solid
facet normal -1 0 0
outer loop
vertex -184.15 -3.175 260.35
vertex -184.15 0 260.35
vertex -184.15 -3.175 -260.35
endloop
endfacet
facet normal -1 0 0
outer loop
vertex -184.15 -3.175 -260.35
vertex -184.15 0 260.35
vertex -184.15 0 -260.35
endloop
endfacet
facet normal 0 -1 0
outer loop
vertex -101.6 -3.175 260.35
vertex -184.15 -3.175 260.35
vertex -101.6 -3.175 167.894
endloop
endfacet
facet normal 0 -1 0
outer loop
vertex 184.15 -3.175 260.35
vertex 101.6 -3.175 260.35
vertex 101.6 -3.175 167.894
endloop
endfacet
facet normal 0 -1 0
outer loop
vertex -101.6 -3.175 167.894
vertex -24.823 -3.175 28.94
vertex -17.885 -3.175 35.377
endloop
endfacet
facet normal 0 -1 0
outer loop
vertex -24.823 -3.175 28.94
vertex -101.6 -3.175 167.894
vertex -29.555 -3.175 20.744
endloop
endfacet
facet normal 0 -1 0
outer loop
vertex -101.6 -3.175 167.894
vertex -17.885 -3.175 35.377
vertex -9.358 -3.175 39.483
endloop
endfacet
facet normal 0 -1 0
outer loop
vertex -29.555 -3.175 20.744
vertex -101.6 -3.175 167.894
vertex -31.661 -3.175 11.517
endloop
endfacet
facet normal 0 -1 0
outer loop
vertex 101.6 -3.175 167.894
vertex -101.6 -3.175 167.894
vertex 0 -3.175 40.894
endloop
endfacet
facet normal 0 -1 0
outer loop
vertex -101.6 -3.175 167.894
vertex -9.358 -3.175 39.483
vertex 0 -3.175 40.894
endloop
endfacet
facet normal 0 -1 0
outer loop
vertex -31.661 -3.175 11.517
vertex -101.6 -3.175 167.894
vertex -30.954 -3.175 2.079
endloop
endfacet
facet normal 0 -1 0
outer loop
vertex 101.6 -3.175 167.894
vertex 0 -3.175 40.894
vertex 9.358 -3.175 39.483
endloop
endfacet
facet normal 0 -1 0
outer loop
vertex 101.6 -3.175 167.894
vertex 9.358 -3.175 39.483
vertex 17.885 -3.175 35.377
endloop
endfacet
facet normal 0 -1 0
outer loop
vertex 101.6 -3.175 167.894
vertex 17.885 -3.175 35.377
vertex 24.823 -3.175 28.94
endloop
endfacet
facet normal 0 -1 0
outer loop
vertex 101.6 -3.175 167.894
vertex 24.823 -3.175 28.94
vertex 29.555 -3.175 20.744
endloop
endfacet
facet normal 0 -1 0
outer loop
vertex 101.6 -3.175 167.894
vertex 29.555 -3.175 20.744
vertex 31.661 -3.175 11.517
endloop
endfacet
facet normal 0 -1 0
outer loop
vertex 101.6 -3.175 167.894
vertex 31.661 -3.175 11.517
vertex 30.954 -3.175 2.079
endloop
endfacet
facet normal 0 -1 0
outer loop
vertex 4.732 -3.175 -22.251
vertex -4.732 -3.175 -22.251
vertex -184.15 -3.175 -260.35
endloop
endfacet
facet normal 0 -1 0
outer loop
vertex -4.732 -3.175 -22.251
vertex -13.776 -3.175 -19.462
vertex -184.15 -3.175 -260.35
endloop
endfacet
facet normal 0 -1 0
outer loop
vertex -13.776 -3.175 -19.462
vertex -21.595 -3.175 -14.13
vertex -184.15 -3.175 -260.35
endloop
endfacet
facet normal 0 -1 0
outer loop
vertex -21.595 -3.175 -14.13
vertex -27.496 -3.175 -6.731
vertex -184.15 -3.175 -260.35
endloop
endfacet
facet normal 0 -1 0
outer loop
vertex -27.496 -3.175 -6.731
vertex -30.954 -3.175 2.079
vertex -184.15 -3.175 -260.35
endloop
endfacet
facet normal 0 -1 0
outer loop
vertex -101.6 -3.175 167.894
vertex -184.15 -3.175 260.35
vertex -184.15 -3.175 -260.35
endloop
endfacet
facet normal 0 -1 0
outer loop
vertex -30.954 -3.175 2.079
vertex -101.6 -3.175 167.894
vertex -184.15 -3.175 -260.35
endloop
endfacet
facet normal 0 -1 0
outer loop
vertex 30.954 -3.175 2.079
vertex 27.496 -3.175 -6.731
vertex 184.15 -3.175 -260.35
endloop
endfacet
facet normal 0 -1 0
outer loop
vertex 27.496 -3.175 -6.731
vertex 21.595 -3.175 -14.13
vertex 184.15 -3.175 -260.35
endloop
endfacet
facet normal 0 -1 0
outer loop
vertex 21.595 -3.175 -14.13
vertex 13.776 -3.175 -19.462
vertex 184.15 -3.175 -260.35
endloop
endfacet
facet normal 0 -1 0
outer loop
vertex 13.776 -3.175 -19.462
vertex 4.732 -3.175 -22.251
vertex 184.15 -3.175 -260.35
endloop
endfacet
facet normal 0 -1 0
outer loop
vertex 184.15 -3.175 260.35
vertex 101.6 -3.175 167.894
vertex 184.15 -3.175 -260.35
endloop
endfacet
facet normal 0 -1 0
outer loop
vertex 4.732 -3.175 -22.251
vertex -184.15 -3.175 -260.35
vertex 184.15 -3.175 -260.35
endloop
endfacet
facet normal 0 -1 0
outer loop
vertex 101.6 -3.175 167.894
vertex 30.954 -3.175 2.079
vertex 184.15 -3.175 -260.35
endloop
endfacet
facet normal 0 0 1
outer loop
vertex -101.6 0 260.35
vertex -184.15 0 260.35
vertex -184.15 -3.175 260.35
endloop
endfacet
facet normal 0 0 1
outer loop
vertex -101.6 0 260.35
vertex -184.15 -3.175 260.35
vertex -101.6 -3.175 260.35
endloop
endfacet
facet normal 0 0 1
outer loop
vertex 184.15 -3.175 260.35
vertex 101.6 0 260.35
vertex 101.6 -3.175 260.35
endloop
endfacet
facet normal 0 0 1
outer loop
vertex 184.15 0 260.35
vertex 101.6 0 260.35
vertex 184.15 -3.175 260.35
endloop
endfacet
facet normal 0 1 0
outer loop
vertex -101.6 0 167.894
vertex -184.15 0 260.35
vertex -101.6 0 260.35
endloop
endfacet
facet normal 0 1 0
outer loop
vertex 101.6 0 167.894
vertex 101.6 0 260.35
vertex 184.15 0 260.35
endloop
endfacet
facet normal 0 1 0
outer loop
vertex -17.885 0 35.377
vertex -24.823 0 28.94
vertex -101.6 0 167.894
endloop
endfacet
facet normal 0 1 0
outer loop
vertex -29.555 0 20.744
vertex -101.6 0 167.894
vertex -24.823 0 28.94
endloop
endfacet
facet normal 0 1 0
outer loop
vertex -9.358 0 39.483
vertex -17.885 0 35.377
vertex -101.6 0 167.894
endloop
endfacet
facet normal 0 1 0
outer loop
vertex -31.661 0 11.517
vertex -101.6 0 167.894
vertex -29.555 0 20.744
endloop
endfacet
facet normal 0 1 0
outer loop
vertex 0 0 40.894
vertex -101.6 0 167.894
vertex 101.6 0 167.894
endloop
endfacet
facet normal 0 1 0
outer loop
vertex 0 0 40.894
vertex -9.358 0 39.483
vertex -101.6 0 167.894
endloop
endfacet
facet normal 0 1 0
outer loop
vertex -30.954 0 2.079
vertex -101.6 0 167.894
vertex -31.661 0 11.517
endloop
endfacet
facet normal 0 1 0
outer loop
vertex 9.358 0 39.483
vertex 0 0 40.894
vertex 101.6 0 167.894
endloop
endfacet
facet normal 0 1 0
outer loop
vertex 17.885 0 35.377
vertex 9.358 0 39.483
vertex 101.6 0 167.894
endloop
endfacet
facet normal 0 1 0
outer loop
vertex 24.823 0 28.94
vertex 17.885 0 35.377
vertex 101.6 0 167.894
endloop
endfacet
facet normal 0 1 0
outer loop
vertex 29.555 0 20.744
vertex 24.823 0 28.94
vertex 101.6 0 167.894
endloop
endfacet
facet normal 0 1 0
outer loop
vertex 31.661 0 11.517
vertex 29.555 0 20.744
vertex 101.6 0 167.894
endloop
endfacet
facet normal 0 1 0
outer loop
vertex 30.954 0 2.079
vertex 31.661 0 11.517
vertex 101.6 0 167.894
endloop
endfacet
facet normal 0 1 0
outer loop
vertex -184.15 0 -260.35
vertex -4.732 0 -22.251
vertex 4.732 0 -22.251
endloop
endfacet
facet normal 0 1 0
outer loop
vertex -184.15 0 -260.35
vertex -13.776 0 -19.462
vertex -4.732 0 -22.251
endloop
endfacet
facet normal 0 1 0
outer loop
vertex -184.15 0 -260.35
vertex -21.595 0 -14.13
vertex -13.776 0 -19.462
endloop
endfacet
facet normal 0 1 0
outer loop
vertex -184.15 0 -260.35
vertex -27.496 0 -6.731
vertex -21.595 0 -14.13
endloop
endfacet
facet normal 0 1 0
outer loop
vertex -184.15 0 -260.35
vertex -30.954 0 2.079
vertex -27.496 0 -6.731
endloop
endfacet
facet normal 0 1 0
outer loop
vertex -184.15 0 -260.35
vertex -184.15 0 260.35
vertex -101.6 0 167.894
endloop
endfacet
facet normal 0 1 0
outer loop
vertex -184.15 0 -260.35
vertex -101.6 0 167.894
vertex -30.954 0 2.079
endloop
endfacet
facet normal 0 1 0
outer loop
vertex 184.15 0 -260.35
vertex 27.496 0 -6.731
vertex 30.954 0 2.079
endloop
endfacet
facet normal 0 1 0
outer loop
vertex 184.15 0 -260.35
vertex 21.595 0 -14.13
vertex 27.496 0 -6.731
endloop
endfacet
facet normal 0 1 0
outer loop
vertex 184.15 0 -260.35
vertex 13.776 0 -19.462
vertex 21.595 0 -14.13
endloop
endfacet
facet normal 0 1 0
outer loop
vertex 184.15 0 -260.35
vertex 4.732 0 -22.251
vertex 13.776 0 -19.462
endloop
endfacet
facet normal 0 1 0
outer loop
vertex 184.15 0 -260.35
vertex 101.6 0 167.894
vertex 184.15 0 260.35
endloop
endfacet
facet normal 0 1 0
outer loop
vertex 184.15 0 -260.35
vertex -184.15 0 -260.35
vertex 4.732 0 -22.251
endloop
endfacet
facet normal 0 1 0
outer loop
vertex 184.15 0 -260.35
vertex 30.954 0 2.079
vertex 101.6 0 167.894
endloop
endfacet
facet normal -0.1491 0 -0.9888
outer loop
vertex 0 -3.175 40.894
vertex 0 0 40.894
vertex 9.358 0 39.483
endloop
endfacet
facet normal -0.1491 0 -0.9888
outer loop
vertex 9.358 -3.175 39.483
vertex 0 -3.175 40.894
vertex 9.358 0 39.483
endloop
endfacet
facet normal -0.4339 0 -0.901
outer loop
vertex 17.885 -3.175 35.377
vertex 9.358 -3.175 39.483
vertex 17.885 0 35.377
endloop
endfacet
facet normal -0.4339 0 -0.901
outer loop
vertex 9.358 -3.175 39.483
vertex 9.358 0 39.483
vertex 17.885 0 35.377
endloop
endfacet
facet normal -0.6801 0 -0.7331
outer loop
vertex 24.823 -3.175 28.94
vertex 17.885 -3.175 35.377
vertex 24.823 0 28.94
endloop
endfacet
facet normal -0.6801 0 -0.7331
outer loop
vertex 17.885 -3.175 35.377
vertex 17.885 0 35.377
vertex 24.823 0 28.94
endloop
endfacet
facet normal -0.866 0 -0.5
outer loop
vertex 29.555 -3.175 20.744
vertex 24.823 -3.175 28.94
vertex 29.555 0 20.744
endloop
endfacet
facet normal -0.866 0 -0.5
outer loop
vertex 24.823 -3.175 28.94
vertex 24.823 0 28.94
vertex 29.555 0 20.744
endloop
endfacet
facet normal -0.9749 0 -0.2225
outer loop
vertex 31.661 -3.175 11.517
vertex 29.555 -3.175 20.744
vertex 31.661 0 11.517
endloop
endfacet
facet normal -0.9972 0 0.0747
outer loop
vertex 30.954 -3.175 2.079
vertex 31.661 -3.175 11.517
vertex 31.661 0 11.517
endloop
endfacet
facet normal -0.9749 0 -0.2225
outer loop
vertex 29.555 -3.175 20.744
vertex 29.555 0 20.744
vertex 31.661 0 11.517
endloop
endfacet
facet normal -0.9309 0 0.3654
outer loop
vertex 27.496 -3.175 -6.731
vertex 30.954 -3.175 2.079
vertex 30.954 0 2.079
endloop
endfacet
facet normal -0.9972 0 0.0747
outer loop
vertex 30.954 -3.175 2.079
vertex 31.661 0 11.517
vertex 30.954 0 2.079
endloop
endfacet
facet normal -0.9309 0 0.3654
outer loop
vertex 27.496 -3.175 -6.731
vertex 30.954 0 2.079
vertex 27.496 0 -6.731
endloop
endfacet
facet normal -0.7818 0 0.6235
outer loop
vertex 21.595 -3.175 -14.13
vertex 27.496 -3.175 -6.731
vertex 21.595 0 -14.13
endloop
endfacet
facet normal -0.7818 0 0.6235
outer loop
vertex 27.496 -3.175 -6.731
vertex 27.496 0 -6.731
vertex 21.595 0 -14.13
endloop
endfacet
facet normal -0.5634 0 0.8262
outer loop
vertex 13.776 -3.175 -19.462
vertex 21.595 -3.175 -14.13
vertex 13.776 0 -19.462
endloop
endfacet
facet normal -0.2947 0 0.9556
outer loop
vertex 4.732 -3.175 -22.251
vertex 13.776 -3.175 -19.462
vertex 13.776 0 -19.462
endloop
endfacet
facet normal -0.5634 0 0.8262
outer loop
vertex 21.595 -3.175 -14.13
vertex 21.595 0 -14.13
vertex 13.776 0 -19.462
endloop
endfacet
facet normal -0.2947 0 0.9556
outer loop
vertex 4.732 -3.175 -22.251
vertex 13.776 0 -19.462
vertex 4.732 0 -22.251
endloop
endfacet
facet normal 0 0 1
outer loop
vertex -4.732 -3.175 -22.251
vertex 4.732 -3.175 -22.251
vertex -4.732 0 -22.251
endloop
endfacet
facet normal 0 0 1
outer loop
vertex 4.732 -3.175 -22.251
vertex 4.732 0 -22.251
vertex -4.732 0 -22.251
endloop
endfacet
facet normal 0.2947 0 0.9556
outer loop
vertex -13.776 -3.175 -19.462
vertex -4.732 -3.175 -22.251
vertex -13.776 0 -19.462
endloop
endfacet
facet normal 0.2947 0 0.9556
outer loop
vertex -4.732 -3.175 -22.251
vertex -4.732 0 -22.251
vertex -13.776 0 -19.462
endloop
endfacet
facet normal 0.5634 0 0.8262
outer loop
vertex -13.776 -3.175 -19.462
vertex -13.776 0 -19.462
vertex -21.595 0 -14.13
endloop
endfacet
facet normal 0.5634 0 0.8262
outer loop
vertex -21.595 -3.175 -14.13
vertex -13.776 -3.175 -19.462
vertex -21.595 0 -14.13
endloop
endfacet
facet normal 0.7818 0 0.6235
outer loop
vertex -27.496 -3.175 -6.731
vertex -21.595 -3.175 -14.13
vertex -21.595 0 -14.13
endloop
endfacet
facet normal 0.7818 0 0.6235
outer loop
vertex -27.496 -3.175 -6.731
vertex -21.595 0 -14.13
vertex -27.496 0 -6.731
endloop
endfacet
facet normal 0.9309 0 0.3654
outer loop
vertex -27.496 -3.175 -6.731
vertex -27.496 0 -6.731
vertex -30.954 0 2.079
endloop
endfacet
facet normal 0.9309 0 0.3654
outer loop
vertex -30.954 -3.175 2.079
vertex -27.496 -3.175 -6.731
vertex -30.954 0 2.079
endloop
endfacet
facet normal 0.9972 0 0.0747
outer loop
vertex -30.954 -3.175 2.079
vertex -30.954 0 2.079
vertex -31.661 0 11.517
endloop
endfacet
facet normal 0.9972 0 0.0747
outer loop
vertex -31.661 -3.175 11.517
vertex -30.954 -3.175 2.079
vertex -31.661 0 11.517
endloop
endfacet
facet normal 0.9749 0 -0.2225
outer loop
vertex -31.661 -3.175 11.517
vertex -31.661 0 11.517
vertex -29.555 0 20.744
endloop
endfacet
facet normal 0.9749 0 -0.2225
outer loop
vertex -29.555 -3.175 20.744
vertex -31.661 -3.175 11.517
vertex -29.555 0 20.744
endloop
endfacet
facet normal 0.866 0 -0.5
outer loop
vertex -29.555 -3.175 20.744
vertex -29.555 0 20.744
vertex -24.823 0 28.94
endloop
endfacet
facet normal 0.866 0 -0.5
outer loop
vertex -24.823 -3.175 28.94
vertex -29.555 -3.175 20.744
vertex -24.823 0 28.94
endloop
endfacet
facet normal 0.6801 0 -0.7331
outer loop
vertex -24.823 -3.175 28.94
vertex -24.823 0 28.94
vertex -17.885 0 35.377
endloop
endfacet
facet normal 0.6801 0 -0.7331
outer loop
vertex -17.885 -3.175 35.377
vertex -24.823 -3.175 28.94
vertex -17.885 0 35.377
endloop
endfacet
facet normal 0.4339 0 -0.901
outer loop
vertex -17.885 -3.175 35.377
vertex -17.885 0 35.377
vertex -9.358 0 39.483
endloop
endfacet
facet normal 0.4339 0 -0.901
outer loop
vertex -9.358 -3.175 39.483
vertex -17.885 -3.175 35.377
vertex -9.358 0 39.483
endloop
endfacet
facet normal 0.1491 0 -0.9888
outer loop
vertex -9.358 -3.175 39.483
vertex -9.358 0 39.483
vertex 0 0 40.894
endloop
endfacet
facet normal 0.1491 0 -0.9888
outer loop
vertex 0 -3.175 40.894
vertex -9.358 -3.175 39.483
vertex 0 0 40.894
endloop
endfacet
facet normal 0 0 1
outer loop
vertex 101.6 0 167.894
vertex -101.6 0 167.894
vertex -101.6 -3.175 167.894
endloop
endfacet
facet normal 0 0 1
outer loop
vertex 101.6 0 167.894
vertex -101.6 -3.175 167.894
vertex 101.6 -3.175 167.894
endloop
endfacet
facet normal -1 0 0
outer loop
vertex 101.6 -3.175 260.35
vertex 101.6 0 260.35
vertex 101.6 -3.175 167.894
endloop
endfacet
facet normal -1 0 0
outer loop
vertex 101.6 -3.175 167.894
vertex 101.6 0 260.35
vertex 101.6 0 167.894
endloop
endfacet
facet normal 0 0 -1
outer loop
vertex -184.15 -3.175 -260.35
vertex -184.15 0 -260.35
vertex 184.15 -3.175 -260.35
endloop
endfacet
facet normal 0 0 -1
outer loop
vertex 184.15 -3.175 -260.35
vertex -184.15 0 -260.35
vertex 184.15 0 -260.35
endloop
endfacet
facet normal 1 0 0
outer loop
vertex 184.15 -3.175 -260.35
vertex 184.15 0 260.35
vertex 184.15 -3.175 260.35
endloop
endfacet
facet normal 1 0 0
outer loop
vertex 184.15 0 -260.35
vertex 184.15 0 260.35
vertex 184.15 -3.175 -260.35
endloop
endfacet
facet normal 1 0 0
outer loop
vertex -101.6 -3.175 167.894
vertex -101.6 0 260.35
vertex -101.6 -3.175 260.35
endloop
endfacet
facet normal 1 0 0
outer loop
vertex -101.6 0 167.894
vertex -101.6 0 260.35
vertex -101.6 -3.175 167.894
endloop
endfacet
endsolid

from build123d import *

# Parameters (mm, degrees)
SKETCH1_W          = 368.3
SKETCH1_H          = 520.7
BASE_FLANGE1_DEPTH = 3.175
SKETCH6_W          = 203.2
SKETCH6_H          = 184.912
CUT_EXTRUDE1_DEPTH = 319.909745265
SKETCH7_R          = 31.75
CUT_EXTRUDE2_DEPTH = 319.909745265


# Sheet-metal steps are written as plain solids
with BuildPart() as part:
    # Sketch1 → Base-Flange1 (new body)
    with BuildSketch(Plane(origin=(0, 0, 0), x_dir=(1, 0, 0), z_dir=(0, 1, 0))):
        Rectangle(SKETCH1_W, SKETCH1_H)
    extrude(amount=-BASE_FLANGE1_DEPTH)

    # Sketch6 → Cut-Extrude1 (cut, through all)
    with BuildSketch(Plane(origin=(0, 0, 0), x_dir=(1, 0, 0), z_dir=(0, 1, 0))):
        with Locations((0, -260.35)):
            Rectangle(SKETCH6_W, SKETCH6_H)
    extrude(amount=-CUT_EXTRUDE1_DEPTH, mode=Mode.SUBTRACT)

    # Sketch7 → Cut-Extrude2 (cut, through all)
    with BuildSketch(Plane(origin=(0, 0, 0), x_dir=(1, 0, 0), z_dir=(0, 1, 0))):
        with Locations(Location((0, -9.144, 0), (0, 0, 270))):
            Circle(SKETCH7_R)
    extrude(amount=-CUT_EXTRUDE2_DEPTH, mode=Mode.SUBTRACT)


solid = part.part
